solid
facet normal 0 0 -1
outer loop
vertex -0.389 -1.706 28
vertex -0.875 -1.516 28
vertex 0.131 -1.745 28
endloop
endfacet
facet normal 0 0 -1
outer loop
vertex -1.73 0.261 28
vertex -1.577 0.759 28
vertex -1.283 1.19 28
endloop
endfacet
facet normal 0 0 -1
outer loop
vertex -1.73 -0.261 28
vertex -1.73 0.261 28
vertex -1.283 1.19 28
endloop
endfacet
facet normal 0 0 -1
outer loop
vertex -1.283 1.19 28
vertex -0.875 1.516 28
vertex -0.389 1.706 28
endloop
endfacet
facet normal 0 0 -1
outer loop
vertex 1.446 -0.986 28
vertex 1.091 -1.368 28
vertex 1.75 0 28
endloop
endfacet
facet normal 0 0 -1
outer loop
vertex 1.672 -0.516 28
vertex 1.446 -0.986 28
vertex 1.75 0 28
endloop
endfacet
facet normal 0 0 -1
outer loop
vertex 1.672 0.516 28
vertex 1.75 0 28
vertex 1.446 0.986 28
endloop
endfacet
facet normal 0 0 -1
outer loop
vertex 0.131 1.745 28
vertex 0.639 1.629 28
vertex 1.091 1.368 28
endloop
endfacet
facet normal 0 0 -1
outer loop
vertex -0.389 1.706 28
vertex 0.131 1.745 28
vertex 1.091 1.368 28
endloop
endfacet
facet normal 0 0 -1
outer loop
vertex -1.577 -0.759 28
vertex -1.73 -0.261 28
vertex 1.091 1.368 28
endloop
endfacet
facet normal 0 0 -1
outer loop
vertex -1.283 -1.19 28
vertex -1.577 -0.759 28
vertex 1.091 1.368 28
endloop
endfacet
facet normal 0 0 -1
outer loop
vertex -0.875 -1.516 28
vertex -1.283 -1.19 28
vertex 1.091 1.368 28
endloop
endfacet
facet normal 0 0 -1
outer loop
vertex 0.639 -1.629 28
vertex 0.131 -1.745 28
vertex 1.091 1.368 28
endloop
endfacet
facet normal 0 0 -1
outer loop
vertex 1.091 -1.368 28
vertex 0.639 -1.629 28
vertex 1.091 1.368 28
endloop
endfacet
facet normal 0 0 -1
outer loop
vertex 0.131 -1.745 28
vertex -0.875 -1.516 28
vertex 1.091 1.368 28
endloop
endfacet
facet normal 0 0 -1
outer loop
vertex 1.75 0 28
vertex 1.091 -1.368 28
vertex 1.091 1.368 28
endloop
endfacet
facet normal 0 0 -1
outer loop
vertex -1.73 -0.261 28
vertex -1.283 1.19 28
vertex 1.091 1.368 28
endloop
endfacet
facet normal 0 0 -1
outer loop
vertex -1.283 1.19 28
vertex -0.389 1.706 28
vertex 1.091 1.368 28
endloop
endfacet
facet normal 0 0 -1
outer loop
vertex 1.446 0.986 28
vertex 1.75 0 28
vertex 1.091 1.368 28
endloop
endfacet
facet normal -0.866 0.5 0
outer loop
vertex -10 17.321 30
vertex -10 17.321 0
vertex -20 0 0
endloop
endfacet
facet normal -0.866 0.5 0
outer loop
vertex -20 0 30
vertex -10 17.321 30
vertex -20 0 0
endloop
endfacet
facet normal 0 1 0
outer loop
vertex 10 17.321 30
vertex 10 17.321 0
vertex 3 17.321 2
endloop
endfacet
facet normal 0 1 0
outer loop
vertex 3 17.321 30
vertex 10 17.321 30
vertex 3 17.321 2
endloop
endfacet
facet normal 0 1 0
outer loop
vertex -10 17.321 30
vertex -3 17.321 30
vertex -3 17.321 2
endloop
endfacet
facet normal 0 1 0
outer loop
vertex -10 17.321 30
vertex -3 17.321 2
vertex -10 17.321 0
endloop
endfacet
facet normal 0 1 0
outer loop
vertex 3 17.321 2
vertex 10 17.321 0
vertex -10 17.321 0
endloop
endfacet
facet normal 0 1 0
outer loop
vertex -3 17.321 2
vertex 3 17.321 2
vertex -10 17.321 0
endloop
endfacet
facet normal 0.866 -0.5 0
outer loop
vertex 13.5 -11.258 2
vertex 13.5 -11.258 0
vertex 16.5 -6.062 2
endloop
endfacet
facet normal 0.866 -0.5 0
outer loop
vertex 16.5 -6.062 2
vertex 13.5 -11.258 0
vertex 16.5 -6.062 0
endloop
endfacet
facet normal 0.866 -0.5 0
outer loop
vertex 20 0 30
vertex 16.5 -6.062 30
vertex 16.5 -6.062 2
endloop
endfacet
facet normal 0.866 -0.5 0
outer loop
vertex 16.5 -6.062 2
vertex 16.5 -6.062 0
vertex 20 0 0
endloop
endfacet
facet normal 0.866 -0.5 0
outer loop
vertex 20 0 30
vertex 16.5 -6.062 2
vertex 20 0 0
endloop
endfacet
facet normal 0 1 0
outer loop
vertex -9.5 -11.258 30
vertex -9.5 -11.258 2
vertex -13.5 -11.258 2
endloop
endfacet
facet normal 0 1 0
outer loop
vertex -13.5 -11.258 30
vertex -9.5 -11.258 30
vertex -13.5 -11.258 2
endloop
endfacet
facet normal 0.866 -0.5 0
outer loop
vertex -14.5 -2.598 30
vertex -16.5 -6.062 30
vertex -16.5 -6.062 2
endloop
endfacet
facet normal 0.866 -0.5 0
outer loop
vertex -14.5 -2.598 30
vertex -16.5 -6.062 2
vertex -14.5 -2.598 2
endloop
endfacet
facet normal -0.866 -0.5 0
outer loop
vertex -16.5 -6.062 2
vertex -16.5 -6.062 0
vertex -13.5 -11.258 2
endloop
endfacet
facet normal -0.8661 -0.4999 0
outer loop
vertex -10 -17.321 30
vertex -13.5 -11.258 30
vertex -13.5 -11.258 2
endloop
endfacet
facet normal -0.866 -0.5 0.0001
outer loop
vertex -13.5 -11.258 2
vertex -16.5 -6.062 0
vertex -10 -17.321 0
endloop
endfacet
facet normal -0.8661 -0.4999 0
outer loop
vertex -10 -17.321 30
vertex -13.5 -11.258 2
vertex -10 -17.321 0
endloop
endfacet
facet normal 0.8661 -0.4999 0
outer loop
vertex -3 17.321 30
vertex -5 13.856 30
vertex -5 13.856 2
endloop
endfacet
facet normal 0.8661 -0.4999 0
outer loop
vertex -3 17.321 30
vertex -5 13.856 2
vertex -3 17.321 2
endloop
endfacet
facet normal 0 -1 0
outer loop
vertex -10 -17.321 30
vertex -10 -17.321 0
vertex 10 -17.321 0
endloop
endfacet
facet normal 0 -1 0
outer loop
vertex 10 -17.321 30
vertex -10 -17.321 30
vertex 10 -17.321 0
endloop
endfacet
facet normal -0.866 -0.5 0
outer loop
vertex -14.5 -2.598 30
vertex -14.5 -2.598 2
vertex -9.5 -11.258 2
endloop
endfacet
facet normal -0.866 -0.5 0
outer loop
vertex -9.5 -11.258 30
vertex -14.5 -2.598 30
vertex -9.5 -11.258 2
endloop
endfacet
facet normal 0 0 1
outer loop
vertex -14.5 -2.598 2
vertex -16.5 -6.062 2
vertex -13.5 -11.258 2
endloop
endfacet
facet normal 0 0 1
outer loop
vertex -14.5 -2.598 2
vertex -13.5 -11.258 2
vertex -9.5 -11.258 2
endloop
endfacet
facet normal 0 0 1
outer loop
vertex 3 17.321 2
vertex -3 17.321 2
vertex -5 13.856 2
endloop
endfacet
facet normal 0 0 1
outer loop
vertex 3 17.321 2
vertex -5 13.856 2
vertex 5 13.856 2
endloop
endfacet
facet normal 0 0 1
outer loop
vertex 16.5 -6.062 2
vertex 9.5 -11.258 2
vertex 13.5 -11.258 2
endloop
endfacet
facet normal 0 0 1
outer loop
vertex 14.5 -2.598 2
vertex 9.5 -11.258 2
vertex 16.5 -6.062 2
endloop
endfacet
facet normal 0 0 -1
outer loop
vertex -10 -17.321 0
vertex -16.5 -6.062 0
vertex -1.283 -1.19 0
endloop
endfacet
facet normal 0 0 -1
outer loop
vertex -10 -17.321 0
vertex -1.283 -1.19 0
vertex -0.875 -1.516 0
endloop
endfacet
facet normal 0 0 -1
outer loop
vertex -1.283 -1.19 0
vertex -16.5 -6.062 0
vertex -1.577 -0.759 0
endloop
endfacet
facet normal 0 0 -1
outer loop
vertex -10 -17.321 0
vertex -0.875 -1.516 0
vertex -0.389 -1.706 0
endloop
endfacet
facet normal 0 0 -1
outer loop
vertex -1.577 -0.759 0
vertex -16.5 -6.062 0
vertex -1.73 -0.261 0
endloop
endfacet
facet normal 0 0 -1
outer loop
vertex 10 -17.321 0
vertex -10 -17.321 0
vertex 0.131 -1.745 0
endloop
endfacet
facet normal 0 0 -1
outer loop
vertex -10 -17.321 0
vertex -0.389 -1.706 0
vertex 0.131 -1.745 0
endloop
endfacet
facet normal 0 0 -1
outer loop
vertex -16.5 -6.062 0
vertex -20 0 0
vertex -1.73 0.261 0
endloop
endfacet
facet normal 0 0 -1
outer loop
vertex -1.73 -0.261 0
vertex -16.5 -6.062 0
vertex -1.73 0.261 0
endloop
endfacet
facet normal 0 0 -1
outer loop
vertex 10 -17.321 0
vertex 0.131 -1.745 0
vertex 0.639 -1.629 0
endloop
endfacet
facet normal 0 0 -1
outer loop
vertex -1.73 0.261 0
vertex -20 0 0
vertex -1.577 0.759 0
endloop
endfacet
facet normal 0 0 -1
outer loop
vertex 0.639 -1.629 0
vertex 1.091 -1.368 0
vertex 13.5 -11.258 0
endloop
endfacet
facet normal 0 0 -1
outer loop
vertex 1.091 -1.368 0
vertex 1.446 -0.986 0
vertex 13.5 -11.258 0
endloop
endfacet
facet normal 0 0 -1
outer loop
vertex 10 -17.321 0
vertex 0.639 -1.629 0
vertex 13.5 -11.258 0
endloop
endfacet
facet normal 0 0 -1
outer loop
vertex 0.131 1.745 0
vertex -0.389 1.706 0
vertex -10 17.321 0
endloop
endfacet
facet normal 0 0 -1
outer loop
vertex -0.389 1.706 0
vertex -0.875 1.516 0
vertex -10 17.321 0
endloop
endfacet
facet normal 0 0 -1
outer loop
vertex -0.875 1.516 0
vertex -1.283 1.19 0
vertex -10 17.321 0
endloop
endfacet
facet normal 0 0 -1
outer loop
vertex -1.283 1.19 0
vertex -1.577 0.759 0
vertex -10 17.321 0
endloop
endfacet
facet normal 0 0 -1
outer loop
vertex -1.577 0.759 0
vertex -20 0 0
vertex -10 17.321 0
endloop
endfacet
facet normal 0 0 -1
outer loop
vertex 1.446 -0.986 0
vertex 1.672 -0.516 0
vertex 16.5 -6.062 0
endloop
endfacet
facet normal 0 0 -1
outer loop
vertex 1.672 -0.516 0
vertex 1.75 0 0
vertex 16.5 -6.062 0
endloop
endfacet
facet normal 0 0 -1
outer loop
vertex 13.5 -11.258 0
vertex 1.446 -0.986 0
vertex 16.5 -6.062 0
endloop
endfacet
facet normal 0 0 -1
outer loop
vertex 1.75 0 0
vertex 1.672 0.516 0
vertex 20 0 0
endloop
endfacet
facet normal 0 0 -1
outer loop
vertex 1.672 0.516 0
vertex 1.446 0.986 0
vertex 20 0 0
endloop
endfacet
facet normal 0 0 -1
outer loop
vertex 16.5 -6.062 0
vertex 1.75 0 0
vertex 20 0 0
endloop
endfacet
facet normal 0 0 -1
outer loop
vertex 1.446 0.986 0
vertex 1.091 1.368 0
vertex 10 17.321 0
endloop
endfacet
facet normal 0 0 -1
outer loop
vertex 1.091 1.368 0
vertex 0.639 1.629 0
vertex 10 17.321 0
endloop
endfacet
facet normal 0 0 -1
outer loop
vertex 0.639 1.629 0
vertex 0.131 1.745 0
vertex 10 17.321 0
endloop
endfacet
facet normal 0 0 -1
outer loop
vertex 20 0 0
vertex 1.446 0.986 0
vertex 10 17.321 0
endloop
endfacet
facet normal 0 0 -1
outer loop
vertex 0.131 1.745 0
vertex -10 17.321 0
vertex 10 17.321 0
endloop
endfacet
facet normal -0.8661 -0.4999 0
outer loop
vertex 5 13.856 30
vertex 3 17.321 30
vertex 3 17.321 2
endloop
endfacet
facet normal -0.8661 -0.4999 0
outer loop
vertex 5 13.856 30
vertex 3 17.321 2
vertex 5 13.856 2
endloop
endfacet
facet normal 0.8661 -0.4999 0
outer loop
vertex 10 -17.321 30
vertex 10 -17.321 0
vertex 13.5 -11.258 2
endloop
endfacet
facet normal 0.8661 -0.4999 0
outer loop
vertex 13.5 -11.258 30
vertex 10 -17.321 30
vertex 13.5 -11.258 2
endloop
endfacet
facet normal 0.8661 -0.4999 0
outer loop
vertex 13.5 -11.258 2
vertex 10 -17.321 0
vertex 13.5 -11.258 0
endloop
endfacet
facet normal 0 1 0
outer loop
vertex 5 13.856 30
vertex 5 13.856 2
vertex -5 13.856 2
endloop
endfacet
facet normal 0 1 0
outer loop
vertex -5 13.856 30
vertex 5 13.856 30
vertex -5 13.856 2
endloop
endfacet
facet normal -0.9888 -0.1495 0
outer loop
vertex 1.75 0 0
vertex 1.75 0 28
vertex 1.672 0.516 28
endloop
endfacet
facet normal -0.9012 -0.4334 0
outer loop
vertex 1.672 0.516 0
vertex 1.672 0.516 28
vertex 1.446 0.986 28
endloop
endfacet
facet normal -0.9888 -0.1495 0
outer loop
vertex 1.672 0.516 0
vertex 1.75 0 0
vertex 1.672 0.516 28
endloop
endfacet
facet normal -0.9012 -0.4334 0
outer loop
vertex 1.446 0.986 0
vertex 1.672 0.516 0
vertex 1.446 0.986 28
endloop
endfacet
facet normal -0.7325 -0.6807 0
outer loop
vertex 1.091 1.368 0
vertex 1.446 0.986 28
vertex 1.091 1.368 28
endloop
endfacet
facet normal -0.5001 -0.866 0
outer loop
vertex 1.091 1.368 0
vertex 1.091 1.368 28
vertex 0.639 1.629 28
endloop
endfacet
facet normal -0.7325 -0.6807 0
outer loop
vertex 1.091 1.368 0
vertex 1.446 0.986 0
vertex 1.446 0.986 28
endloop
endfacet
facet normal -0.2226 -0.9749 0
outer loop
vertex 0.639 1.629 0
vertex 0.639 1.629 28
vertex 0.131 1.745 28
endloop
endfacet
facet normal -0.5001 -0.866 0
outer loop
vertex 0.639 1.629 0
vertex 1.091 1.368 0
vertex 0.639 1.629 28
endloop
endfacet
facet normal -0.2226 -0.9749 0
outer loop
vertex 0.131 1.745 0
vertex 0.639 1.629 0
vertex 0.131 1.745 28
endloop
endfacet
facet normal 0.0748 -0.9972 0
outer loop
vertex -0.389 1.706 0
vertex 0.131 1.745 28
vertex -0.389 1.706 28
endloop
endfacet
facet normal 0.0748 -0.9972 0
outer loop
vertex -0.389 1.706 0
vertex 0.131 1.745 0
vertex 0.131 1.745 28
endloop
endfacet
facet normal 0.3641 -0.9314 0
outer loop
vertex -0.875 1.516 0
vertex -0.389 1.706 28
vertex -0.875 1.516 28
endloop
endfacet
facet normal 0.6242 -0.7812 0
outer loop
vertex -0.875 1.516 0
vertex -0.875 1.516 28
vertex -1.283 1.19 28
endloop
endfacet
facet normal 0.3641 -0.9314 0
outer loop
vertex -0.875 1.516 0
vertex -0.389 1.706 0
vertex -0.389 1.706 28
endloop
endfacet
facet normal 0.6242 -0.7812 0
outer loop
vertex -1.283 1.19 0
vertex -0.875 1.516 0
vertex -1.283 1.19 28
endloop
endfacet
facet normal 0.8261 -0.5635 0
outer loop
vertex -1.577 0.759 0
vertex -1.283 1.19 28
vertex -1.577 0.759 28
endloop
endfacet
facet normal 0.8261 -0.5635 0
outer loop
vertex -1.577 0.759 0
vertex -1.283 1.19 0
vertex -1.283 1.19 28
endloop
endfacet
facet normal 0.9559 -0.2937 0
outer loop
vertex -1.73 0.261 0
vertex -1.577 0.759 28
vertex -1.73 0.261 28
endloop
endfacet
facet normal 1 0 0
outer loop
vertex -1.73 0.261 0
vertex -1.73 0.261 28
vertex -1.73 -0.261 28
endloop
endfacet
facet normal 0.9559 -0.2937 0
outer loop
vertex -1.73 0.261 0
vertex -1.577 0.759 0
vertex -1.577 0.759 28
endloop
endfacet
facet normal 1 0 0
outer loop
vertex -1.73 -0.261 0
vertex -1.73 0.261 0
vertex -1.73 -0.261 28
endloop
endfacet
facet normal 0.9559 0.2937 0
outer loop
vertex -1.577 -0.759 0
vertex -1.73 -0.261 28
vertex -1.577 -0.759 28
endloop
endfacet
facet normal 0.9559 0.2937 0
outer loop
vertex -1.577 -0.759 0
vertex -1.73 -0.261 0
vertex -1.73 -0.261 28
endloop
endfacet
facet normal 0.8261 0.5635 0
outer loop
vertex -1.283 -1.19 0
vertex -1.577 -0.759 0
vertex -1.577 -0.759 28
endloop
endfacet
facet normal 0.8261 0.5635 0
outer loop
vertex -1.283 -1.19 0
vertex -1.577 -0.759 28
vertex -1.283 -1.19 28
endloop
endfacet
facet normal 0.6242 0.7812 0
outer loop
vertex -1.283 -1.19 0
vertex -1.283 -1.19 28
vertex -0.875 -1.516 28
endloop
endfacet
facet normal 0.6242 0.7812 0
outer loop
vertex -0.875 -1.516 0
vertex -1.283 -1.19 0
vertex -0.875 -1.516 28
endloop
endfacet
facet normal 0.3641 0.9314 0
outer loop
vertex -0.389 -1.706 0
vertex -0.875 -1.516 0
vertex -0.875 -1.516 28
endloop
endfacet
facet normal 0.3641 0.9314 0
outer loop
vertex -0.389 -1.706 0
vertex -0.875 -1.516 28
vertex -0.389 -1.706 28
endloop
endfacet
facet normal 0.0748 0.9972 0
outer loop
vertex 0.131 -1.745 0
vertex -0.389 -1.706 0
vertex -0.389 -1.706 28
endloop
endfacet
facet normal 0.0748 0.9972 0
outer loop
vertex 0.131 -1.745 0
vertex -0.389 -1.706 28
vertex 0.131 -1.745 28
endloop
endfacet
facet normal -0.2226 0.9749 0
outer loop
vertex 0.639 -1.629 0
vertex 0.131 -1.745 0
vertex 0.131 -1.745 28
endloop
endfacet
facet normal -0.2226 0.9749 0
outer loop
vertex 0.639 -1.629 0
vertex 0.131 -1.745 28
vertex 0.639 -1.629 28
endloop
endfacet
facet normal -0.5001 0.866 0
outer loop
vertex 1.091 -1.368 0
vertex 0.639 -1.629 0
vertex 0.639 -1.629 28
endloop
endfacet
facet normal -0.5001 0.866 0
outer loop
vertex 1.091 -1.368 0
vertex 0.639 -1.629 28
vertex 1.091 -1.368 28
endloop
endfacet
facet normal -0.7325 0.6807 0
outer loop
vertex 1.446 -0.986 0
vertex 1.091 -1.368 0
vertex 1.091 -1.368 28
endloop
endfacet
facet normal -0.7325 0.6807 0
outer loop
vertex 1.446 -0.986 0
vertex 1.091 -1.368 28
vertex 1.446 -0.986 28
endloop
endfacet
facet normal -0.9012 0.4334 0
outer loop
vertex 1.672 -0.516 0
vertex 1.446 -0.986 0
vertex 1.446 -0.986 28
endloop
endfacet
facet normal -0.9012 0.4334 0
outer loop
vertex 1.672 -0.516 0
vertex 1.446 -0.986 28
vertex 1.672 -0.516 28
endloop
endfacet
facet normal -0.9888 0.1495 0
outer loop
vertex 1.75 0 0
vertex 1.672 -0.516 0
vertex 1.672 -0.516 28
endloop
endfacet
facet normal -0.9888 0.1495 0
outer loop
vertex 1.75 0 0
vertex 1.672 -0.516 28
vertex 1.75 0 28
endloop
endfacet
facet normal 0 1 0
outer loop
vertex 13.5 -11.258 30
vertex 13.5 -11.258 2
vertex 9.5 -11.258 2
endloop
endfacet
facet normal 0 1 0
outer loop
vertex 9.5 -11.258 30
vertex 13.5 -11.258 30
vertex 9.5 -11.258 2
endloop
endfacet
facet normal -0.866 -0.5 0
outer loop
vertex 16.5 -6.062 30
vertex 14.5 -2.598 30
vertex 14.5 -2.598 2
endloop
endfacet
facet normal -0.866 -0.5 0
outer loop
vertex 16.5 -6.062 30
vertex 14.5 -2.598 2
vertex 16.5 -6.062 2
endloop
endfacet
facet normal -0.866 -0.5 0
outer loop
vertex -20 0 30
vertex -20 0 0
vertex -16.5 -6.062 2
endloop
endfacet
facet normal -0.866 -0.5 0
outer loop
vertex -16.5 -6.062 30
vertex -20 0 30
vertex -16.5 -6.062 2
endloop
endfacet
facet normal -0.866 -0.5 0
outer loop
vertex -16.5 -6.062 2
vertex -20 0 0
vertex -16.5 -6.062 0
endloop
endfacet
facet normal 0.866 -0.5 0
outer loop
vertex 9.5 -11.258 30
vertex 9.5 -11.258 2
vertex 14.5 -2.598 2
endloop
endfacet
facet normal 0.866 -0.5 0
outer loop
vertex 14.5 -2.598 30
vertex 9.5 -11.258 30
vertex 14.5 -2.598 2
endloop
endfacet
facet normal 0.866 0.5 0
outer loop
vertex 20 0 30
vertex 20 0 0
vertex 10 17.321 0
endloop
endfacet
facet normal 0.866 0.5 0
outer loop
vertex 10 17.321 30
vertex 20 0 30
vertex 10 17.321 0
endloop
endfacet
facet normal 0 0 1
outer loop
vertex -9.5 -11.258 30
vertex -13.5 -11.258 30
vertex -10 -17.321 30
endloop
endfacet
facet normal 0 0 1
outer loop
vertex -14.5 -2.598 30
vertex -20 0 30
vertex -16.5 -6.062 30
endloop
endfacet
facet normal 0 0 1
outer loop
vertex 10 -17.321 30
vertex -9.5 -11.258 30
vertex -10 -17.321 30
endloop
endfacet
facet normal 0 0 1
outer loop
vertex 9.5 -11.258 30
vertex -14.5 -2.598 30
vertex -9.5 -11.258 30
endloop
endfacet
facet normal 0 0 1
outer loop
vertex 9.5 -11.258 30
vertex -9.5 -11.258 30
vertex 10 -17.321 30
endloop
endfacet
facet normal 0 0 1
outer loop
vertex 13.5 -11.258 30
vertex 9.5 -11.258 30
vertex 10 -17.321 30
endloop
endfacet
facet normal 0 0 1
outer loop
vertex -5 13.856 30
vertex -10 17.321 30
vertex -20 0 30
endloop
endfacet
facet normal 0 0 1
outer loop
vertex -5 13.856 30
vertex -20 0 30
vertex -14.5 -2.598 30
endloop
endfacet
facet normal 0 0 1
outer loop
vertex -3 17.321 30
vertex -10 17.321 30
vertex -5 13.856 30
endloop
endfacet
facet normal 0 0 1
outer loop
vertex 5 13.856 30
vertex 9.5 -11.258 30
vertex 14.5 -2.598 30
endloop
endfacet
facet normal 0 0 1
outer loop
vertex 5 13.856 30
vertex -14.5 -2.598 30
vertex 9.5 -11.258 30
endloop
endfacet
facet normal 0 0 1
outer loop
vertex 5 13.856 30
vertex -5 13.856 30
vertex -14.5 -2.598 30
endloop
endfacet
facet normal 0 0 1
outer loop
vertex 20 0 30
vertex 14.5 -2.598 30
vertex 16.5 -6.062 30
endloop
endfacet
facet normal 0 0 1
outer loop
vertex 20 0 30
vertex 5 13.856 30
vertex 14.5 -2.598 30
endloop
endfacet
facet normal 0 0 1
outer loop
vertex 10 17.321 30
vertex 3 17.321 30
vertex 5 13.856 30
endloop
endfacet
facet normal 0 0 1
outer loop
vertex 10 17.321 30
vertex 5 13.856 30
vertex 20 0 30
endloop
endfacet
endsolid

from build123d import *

# Parameters (mm, degrees)
F0_R     = 1.75
F1_DEPTH = 30
F2_DEPTH = 2
F3_START = 28
F3_DEPTH = 2


# Not quite as in the source:
# - ends of sketch curves that miss each other by under 0.0002 mm in the source are joined


with BuildPart() as f1:
    # F0 (on Top) → F1 (new body)
    with BuildSketch(Plane.XY):
        Polygon((-10, -17.3205080757), (10, -17.3205080757), (13.500000035, -11.2583301886), (9.5000001398, -11.2583302492), (14.5000001398, -2.5980762114), (16.5000001398, -6.0621778265), (20, 0), (10, 17.3205080757), (3, 17.3205080757), (5, 13.8564064606), (-5, 13.8564064606), (-3, 17.3205080757), (-10, 17.3205080757), (-20, 0), (-16.4999999301, -6.0621779476), (-14.4999999301, -2.5980763325), (-9.4999999301, -11.2583303703), (-13.4999999301, -11.2583303703), align=None)
        Circle(F0_R, mode=Mode.SUBTRACT)
    extrude(amount=F1_DEPTH)

    # F0 (on Top) → F2 (join)
    with BuildSketch(Plane.XY):
        Polygon((-16.4999999301, -6.0621779476), (-13.4999999301, -11.2583303703), (-9.4999999301, -11.2583303703), (-14.4999999301, -2.5980763325), align=None)
        Polygon((5, 13.8564064606), (3, 17.3205080757), (-3, 17.3205080757), (-5, 13.8564064606), align=None)
        Polygon((9.5000001398, -11.2583302492), (13.5000001398, -11.2583302492), (16.500000035, -6.0621777659), (14.5000001398, -2.5980762114), align=None)
    extrude(amount=F2_DEPTH)

    # F0 (on Top) → F3 (join)
    with BuildSketch(Plane.XY.offset(F3_START)):
        Circle(F0_R)
    extrude(amount=F3_DEPTH)


solid = f1.part
